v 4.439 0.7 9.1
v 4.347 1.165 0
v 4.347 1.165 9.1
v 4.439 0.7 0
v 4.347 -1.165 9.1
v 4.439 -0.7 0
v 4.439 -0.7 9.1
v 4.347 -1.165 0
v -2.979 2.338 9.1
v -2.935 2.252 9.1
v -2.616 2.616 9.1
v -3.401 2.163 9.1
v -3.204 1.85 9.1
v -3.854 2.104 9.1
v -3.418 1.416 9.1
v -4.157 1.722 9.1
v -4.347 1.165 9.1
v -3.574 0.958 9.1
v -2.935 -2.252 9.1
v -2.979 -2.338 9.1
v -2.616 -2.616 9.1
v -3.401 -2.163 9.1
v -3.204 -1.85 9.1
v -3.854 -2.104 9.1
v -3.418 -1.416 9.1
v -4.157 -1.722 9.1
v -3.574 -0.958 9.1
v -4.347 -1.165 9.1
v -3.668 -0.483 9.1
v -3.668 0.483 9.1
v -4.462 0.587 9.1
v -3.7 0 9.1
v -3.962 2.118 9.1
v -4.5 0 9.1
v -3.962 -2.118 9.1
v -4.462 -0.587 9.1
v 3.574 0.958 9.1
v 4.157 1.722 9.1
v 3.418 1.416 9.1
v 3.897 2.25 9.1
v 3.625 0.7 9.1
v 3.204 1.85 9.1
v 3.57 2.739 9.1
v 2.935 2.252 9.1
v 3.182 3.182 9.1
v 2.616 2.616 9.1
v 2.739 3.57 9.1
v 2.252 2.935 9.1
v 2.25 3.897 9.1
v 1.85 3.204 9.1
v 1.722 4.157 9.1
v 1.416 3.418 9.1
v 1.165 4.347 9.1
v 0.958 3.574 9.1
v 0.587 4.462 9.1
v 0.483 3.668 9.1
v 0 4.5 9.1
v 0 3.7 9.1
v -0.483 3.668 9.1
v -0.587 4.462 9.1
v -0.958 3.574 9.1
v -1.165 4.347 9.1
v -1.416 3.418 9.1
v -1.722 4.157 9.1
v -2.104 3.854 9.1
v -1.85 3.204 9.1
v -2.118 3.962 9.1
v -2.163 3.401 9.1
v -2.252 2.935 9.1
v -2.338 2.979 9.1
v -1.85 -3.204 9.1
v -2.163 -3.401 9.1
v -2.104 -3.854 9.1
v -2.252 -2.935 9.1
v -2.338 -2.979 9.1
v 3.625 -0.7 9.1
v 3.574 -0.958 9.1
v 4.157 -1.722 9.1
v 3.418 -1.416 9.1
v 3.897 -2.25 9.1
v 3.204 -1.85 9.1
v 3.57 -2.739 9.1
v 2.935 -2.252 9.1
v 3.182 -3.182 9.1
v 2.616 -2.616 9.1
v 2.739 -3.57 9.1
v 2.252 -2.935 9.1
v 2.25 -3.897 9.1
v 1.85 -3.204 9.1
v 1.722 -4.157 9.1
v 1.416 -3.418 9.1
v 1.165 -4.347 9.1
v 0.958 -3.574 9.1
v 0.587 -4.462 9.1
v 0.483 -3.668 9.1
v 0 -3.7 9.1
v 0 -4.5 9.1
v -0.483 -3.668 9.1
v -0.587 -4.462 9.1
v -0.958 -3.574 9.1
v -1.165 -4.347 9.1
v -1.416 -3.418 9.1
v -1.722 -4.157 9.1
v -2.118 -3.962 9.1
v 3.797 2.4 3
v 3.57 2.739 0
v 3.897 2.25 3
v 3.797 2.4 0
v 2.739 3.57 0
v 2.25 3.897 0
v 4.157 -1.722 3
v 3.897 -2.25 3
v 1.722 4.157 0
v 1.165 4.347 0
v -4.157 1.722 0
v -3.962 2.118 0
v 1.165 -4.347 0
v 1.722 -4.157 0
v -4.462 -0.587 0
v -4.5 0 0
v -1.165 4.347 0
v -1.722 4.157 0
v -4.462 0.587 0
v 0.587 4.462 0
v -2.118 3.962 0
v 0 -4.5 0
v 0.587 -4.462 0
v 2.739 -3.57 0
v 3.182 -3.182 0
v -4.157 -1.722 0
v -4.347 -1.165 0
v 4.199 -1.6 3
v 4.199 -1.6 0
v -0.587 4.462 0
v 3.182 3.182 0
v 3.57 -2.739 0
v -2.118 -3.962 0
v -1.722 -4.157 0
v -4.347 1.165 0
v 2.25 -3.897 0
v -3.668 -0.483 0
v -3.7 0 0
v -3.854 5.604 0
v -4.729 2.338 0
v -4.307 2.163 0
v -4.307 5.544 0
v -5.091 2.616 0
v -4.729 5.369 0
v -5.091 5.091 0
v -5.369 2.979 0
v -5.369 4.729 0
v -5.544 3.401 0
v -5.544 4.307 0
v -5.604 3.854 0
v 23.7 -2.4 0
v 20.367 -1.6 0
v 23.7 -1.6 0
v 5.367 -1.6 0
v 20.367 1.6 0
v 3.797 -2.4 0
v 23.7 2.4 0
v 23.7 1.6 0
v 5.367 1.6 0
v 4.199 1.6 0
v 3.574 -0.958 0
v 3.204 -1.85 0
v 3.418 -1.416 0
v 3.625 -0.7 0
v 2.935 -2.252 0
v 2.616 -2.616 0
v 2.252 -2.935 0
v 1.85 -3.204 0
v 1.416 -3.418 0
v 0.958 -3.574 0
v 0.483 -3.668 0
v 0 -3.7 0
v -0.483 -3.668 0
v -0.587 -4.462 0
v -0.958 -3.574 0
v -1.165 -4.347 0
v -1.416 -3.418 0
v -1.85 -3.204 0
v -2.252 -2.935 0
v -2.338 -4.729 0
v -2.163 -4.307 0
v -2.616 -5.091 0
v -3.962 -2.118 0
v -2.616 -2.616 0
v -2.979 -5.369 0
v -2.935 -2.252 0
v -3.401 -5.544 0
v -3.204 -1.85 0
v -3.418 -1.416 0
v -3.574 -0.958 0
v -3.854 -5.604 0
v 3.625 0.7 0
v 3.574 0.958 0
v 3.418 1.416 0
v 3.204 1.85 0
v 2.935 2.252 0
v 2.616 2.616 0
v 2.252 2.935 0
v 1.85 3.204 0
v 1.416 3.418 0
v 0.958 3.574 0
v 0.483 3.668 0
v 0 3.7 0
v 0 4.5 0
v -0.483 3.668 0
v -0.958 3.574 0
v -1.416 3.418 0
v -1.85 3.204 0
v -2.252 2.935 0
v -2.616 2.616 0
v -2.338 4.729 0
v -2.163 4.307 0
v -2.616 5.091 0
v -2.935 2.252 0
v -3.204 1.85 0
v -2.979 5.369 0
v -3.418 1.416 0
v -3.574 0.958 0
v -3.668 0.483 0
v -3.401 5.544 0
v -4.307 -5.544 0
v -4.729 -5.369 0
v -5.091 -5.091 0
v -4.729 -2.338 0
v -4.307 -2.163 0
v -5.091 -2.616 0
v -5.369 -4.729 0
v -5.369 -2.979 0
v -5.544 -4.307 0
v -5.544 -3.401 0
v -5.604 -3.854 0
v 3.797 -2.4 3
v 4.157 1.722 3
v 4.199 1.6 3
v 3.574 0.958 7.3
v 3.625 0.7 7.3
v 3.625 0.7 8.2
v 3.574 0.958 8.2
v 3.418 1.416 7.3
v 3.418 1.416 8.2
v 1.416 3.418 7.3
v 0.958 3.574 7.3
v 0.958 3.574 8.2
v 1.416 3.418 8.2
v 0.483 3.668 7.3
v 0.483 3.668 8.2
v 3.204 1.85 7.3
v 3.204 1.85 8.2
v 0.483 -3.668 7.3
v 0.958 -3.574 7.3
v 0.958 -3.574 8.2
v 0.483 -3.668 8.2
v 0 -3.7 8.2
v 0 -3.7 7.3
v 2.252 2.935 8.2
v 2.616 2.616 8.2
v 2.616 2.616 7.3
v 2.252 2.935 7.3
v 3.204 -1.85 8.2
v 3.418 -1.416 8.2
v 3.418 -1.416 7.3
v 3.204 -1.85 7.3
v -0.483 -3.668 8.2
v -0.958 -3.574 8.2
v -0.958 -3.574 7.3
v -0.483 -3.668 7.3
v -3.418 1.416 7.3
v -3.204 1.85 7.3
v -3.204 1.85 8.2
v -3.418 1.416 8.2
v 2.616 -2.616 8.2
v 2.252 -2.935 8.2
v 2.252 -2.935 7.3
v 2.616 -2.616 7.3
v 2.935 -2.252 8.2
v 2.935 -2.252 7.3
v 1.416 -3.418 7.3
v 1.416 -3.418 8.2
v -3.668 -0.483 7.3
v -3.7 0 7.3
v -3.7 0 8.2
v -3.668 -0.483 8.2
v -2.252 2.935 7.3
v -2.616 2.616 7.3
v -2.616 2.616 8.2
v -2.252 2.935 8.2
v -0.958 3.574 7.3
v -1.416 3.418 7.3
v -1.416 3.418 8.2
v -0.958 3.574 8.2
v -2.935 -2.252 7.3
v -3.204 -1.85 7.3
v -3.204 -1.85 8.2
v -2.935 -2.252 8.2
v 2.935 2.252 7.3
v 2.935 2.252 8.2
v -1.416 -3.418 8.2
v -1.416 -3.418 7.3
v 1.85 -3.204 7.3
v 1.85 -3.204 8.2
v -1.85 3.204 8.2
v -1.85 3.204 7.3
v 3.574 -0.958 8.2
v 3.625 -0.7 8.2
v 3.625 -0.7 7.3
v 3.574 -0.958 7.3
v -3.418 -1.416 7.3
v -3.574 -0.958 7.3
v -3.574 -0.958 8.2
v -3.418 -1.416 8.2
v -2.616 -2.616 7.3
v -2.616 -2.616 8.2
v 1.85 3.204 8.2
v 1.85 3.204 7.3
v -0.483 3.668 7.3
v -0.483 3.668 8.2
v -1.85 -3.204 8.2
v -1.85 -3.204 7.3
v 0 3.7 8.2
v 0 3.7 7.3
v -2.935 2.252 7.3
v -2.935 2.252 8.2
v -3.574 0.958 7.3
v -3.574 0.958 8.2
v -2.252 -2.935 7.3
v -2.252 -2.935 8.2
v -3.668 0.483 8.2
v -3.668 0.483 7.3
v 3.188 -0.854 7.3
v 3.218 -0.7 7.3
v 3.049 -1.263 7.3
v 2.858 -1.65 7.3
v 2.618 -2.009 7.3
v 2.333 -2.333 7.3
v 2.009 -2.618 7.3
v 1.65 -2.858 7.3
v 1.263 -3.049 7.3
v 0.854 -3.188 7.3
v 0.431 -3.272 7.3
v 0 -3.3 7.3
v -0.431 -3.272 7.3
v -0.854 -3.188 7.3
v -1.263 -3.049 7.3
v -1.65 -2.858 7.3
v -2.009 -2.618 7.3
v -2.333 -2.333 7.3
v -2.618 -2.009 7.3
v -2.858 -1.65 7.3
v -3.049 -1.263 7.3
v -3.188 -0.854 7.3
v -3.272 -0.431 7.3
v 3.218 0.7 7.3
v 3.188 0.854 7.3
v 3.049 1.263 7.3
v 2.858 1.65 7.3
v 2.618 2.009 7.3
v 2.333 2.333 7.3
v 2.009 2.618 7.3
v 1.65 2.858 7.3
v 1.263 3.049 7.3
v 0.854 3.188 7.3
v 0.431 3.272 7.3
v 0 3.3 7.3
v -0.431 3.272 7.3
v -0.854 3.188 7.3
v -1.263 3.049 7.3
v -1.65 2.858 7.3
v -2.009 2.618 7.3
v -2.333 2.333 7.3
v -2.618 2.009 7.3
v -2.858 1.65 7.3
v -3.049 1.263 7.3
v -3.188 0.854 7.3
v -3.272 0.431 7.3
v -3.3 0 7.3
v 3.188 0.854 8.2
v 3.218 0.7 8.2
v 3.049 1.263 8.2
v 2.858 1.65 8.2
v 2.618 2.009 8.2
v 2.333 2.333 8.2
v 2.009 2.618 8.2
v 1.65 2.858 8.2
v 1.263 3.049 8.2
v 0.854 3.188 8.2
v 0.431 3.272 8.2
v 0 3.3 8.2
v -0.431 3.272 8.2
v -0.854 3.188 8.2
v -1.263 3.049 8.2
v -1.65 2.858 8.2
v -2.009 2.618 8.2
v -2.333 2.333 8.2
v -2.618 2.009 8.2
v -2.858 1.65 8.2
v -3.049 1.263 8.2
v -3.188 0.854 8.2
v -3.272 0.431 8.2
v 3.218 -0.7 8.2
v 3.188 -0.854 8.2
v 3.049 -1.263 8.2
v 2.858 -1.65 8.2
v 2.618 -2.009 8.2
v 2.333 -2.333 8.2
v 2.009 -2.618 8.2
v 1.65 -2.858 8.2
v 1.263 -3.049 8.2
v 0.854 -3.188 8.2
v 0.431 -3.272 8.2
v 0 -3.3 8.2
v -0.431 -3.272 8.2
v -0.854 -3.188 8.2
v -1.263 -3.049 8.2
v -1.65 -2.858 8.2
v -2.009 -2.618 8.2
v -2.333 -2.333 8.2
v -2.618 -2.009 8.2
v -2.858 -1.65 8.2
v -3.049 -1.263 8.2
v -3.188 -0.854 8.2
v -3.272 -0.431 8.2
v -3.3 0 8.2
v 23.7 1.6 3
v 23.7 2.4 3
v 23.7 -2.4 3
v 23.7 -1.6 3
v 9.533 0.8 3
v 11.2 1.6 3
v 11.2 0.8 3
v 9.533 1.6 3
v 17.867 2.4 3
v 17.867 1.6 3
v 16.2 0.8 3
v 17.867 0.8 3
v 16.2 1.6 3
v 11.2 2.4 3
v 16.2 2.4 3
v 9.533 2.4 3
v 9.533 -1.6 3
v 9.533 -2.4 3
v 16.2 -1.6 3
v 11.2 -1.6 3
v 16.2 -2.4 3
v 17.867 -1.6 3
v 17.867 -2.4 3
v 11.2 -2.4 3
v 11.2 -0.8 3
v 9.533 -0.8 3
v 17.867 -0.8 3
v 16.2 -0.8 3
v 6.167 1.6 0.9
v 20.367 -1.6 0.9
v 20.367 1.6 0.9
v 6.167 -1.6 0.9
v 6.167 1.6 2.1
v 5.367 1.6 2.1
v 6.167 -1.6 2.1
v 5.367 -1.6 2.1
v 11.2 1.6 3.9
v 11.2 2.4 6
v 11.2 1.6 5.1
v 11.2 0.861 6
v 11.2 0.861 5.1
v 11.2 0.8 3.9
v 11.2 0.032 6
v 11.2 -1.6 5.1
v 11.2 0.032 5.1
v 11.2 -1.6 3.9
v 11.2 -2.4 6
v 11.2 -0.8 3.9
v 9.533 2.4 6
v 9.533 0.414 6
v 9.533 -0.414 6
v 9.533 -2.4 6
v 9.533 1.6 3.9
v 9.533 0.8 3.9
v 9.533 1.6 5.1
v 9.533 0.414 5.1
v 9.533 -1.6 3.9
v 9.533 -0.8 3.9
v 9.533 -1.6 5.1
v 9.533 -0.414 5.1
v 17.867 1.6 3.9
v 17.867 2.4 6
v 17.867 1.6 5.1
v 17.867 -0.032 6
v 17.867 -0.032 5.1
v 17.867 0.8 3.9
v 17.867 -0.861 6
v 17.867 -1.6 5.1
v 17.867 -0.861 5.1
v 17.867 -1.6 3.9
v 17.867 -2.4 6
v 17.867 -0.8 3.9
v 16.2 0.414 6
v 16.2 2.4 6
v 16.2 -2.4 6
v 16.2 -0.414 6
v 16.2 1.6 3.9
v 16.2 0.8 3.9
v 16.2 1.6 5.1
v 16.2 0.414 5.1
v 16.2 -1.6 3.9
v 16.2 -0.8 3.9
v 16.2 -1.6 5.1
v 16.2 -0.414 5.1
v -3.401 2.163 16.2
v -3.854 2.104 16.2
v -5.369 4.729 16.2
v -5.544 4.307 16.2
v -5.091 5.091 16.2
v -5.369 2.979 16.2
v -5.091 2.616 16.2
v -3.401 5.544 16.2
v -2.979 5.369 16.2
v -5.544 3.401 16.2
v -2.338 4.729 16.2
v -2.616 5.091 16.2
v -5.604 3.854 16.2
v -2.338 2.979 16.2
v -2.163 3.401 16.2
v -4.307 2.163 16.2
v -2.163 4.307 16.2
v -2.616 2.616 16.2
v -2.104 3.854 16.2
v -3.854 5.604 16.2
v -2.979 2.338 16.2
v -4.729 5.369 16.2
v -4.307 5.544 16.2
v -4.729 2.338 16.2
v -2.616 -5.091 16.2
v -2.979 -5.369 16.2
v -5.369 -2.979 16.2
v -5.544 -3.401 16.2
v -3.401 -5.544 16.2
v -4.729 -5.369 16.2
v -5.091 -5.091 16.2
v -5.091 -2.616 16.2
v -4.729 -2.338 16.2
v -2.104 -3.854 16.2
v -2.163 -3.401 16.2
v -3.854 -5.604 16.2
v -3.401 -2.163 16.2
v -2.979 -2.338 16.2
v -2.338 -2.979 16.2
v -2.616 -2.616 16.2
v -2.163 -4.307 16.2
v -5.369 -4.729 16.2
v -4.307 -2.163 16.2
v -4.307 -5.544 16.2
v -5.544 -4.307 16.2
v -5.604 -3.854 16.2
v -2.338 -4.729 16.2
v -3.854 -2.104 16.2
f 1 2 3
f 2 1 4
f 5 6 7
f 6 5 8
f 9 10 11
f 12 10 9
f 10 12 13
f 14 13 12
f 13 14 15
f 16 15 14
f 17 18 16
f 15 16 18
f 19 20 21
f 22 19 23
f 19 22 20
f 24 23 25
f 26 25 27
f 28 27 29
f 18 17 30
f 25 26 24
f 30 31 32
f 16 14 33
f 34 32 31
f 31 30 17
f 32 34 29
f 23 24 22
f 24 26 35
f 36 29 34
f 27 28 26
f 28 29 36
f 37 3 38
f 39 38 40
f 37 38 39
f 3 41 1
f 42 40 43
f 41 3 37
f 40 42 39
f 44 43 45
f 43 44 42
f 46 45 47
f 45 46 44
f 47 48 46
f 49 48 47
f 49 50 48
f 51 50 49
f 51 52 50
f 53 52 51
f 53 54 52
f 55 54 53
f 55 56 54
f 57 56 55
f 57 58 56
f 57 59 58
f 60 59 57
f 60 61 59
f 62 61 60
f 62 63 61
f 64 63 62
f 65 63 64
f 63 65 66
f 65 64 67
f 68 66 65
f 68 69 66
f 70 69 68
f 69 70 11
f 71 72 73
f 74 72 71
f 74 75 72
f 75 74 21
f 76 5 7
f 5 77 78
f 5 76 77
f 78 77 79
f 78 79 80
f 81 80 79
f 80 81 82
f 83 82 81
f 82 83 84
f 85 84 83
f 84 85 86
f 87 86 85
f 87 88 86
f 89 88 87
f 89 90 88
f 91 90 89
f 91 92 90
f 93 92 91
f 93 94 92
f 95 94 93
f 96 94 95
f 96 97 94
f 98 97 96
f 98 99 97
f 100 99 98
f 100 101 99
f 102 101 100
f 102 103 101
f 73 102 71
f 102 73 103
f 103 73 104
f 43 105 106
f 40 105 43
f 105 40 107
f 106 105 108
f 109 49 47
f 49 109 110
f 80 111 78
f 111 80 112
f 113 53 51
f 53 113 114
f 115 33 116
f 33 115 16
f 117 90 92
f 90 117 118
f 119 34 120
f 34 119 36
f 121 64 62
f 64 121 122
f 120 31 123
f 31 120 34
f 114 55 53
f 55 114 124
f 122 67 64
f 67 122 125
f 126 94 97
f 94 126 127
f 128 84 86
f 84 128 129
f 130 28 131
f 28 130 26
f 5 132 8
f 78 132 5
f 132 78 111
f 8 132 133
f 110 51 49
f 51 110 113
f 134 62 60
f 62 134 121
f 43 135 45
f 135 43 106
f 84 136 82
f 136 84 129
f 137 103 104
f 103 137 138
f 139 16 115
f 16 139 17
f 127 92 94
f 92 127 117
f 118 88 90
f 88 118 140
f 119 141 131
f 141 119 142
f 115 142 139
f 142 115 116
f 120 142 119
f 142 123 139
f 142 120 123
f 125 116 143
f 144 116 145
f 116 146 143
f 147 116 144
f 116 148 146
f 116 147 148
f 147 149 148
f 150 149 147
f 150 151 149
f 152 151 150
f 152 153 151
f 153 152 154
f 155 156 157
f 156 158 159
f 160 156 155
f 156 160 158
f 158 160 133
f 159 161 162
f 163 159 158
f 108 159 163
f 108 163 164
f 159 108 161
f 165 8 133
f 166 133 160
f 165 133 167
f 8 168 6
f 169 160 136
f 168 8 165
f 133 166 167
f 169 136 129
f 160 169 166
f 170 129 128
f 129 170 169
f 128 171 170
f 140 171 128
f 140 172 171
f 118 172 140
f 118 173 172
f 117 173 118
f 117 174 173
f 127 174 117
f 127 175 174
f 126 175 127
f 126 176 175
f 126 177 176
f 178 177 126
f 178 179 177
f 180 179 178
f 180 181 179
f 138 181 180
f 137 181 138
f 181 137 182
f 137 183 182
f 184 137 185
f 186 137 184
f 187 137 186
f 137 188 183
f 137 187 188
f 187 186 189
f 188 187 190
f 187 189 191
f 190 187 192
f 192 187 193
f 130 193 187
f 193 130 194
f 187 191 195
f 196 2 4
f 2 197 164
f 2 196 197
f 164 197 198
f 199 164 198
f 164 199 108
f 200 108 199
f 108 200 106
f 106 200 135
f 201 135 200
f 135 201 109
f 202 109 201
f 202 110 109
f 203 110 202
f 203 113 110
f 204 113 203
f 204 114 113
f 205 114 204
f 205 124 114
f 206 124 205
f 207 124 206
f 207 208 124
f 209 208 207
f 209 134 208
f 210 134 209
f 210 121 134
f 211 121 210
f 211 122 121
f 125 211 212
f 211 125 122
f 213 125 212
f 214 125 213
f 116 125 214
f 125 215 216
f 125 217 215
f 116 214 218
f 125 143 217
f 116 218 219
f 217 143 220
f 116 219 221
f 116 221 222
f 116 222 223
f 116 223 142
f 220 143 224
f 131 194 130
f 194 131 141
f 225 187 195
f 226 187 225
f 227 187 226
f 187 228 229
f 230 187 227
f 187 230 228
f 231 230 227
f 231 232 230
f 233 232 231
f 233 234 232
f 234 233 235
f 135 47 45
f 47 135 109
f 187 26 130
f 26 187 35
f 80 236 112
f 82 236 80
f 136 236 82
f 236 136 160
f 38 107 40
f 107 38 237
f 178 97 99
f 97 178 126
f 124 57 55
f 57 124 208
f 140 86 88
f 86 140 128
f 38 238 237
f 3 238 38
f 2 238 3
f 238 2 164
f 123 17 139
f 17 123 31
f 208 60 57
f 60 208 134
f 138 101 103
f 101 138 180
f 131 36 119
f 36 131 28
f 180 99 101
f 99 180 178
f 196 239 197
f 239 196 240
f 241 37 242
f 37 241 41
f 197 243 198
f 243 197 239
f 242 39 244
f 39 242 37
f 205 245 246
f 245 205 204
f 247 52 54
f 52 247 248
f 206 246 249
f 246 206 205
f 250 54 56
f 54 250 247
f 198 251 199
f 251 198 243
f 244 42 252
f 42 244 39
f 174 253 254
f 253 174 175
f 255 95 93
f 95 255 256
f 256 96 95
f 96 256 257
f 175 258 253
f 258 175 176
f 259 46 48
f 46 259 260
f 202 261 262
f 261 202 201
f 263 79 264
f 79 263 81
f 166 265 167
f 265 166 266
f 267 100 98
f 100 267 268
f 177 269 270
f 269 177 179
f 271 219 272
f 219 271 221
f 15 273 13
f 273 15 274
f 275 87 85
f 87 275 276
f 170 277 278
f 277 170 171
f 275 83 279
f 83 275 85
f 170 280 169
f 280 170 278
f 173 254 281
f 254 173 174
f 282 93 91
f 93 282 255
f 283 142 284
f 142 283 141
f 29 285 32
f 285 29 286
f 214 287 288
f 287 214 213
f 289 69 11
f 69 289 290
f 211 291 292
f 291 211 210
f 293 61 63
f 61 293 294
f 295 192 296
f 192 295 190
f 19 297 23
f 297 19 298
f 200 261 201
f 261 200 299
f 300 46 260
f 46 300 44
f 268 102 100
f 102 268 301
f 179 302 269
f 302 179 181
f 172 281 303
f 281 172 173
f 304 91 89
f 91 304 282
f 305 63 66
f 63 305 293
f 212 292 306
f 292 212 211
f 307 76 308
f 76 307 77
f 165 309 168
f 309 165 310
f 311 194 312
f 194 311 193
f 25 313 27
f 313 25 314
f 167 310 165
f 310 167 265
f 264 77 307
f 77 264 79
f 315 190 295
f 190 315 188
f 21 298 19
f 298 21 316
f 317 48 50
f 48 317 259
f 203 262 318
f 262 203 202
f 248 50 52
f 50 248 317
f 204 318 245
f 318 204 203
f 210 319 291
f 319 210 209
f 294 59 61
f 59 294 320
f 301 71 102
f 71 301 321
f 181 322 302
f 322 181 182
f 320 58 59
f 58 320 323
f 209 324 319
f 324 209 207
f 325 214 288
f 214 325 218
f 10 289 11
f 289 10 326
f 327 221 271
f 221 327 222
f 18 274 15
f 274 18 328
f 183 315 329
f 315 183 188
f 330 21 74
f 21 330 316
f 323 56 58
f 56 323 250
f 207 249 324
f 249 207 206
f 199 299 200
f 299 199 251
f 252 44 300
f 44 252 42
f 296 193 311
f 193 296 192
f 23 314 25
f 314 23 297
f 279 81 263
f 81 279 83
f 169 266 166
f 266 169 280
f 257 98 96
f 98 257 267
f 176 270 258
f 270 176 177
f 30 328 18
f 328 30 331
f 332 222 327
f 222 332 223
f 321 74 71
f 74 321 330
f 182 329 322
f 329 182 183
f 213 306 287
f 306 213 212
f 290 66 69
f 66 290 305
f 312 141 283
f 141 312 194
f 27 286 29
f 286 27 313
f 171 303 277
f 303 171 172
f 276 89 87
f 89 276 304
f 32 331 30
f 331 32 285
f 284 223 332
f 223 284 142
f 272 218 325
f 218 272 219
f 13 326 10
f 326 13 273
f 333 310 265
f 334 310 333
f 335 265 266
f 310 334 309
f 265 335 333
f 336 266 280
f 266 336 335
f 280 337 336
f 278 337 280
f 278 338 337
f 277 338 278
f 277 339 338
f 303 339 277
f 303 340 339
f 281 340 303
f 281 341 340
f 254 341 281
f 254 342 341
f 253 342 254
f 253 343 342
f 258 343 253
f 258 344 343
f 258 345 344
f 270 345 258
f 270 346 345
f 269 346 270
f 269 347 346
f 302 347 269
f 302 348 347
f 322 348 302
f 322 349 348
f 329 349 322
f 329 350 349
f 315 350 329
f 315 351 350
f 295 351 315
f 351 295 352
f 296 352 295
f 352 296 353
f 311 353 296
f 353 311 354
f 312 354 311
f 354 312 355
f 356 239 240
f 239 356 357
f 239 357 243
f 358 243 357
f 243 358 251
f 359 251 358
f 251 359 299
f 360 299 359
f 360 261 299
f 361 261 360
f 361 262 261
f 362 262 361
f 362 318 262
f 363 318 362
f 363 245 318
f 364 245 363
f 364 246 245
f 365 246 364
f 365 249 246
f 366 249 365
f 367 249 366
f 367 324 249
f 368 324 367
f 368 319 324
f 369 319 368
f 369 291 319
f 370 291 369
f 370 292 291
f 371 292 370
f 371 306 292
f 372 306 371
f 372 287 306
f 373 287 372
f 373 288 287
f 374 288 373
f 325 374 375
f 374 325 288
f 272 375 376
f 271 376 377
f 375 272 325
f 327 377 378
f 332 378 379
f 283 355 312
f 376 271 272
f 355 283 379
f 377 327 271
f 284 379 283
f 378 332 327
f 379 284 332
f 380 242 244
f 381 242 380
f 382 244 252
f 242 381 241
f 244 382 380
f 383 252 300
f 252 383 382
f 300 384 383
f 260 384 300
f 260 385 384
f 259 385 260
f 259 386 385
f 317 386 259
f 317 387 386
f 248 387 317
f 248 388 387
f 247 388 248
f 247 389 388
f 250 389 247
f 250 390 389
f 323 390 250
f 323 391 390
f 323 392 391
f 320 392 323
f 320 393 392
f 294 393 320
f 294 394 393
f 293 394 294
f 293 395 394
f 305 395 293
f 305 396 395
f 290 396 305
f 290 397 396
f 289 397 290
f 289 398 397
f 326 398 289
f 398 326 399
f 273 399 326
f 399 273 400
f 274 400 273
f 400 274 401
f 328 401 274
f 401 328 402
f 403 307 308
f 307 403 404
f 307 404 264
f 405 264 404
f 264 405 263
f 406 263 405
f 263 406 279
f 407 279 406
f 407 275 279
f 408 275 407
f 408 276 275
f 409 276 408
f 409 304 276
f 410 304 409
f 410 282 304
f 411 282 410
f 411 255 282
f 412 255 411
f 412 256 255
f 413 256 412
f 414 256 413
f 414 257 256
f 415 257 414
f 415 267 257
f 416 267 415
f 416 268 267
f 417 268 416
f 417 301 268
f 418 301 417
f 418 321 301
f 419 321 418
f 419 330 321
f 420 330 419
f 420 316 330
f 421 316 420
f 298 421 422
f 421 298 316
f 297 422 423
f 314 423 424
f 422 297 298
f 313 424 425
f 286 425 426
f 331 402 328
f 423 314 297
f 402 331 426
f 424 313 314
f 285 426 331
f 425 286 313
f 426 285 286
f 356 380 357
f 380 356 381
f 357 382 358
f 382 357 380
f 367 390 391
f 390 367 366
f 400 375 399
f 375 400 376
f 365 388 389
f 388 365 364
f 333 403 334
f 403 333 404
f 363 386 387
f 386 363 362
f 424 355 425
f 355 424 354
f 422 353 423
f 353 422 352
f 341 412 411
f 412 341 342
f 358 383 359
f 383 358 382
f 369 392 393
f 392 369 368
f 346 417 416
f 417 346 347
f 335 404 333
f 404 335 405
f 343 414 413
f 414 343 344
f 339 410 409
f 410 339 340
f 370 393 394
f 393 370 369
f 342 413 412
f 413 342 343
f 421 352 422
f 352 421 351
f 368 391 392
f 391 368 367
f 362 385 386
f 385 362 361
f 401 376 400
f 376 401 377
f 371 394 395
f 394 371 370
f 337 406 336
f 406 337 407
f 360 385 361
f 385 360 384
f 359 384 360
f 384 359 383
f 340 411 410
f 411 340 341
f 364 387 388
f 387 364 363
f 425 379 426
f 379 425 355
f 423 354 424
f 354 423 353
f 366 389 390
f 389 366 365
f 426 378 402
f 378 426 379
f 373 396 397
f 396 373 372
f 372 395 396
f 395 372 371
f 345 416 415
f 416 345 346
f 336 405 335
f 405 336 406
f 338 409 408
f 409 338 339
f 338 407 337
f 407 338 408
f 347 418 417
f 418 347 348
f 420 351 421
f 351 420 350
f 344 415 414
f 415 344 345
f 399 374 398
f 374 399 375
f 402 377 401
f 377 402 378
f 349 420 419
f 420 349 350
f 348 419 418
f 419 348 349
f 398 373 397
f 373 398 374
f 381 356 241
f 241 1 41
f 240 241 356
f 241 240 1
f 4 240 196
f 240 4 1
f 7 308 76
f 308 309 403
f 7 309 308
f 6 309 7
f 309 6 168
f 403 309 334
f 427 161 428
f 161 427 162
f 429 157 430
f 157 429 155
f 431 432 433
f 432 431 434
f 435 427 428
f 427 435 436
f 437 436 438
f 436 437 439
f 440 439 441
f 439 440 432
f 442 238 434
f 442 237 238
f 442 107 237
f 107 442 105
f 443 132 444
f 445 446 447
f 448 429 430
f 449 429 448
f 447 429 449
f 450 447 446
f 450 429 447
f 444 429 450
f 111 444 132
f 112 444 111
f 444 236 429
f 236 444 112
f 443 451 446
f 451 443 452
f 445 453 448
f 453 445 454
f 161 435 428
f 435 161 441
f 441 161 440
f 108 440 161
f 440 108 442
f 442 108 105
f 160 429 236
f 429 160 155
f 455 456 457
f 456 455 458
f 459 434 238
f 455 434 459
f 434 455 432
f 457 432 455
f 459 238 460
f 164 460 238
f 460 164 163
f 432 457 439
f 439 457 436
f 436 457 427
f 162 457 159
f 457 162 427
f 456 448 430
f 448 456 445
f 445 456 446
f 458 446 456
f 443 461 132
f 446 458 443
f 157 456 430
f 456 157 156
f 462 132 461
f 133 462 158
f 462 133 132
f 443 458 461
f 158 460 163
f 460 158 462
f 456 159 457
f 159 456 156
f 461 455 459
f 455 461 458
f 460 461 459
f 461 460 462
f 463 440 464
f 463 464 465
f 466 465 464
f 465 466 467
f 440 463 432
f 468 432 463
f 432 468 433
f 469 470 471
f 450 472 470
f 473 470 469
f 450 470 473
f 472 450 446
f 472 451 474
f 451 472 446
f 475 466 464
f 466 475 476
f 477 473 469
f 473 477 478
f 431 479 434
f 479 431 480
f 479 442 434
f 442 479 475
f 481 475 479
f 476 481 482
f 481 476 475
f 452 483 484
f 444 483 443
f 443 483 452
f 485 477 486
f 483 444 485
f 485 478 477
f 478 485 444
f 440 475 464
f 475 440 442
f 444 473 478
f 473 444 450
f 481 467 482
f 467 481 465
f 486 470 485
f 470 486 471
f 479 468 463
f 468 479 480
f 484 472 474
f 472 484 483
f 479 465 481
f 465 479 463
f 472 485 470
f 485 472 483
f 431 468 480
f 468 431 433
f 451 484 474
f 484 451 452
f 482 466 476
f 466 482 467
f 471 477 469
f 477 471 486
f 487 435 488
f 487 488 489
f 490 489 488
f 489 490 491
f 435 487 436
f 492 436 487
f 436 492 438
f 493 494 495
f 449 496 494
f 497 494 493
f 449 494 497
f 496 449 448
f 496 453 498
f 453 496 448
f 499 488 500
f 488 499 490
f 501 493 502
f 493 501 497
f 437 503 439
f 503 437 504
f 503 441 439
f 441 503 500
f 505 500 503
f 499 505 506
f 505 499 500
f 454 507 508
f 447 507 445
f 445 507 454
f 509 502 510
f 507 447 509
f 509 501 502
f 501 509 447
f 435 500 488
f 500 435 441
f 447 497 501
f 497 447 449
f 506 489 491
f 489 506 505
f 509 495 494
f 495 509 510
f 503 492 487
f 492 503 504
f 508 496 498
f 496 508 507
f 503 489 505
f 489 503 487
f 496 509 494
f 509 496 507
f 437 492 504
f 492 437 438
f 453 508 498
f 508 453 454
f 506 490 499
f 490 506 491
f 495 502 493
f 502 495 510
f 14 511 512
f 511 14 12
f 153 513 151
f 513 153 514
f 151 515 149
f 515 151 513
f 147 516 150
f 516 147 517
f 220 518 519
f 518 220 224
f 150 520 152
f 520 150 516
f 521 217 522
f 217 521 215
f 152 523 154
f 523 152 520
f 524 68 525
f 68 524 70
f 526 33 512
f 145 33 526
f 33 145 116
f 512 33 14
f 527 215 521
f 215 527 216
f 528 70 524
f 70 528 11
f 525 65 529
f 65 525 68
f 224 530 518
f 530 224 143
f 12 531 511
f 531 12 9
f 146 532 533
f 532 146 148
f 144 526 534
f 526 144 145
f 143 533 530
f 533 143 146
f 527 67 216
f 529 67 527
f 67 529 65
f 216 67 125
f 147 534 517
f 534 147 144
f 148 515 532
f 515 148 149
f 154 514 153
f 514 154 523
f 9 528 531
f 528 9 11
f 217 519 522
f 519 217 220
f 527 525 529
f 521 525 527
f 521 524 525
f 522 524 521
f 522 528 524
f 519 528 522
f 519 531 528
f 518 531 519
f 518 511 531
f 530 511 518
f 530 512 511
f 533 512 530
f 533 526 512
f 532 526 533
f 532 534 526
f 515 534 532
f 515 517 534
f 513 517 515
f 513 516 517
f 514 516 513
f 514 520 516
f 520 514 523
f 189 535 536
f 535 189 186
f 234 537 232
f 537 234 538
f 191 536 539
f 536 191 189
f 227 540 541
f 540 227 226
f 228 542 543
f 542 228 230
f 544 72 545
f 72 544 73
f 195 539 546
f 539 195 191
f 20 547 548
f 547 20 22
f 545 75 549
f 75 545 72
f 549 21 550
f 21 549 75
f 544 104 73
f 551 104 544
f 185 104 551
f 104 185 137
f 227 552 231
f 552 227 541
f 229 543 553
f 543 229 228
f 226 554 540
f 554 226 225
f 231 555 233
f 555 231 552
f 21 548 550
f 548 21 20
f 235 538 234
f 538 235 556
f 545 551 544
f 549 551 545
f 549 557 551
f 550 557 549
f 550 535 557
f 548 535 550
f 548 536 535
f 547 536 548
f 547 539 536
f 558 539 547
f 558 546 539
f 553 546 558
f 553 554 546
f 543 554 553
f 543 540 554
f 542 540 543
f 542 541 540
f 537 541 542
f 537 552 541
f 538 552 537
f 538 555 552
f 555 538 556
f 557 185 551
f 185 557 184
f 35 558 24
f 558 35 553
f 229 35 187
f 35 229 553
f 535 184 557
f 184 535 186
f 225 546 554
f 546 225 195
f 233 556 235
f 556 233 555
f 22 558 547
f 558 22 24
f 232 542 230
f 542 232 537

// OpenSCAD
// Crazyflie 2.0 motor mount

// Copyright (C) 2015 Embecosm Limited (www.embecosm.com)

// Contributor: Jeremy Bennett <jeremy.bennett@embecosm.com>

// This file is licensed under the Creative Commons Attribution-ShareAlike 3.0
// Unported License. To view a copy of this license, visit
// http://creativecommons.org/licenses/by-sa/3.0/ or send a letter to Creative
// Commons, PO Box 1866, Mountain View, CA 94042, USA.


// Unlike the original motor-mount, this is a conceptual equivalent, more
// suited for 3D printing on a Rep Rap.

// Stick the various parts together in the correct place.  Everything sits on
// or above the X-Y plane, with the motor mount cylinder centered on the
// origin.


// Tiny amount to ensure overlap for simple manifolds
EPS = 0.001;

// Vertical wall thickness throughout. Best if a multiple of the layer
// thickness (so needs slic3r coordination).
TV = 0.9;

// Horizontal wall thickness throughout. Best if a multiple of the head
// diameter.
TH = 0.8;

// Constants defining the components
MOTOR_CYL_D    = 7.4;           // Motor is 6.9, this allows for "bleed"
MOTOR_CYL_R    = MOTOR_CYL_D / 2;
MOTOR_CYL_H    = 9.1;           // Real cylinder extends 0.8 below
MOTOR_SLOT_W   = 1.4;
MOTOR_RIDGE_T  = 0.4;

LEG_H = 16.2;                   // Real leg extends 0.8 below
LEG_W =  3.5;

// PCB dimensions
ARM_W =  3.2;                   // PCB is actually 3.0
ARM_T =  2.1;                   // PCB is actually 1.4
ARM_L = 20.0;
BAR_W = ARM_L / 12;

// Hook
HOOK_H = 3.0;

// The motor cylinder

module motor_cyl () {
   $fn = 48;
   difference () {
      union () {
         // The main cylinder
         difference () {
            cylinder (r = MOTOR_CYL_R + TH, h = MOTOR_CYL_H, center = false);
            cylinder (r = MOTOR_CYL_R,      h = MOTOR_CYL_H, center = false);
         }
         // The ridge 1/2 wall thickness and 1 wall thickness up from the bottom
         translate (v = [0, 0, MOTOR_CYL_H - TV * 2])
            difference () {
               cylinder (r = MOTOR_CYL_R + EPS,    h = TV,  center = false);
               cylinder (r = MOTOR_CYL_R - TH / 2, h = TV , center = false);
            }
      }
      // Slot
      translate (v = [0, -MOTOR_SLOT_W / 2, 0])
         cube (size = [MOTOR_CYL_R *2, MOTOR_SLOT_W, MOTOR_CYL_H],
               center = false);
   }
}


// The legs. For now we do as a cube

// @param  off  Distance to translate along X axis before rotating
// @param  a    Angle to rotate around Z axis

module legs (off, a) {
   $fn = 24;
   rotate (a = [0, 0, a])
      translate (v = [off + LEG_W / 2,, 0])
	 cylinder (r = LEG_W / 2, h = LEG_H, center = false);
}


// The basic ARM

// @param  xoff  Offset in X direction

module arm (xoff) {
   translate (v = [xoff, -ARM_W / 2 - TH, 0]) {
      // Main bar
      difference () {
         cube (size = [ARM_L, ARM_W + TH * 2, ARM_T + TV], center = false);
         // Hollow for PCB
         translate (v = [0, TH, TV])
            cube (size = [ARM_L, ARM_W, ARM_T], center = false);
         // Original has 4 Cutouts in base for flexibility. We just provide
         // the one at each end.
         translate (v = [0, TH, 0])
            cube (size = [BAR_W, ARM_W, TV + EPS], center = false);
         translate (v = [BAR_W * 10, TH, 0])
            cube (size = [BAR_W * 2 + EPS, ARM_W, TV + EPS], center = false);
      }
      // endstop is BAR_W in from the end
      translate (v = [BAR_W, TH, 0])
         cube (size = [TH, ARM_W, ARM_T], center = false);
   }
}


// Barrel for wire hooks

// Wire hooks across the top

// @param[in] xoff  Offset from X direction
// @param[in] ang   Angle to rotate the top slot

module wire_hook (xoff, ang) {
   translate (v = [xoff, 0, ARM_T + TV])
      difference () {
         // Basic hollow cube
         translate (v = [0, -ARM_W / 2 - TH, 0])
            cube (size = [BAR_W, ARM_W + TH * 2, HOOK_H], center = false);
         translate (v = [0, -ARM_W / 2, TV])
            cube (size = [BAR_W, ARM_W, HOOK_H - TV * 2], center = false);
         // Slot at bottom
         translate (v = [0, -ARM_W / 2 + TH, 0])
            cube (size = [BAR_W, ARM_W - TH * 2, TV], center = false);
         // Slot at top for wire
         rotate (a = [0, 0, ang])
            translate (v = [-BAR_W, -TH / 2, HOOK_H - TV])
               cube (size = [BAR_W * 3, TH, TV], center = false);
      }
}


// Stick everything together.
module motor_mount () {
   motor_cyl ();
   // Legs are embedded in the cylinder wall
   legs (MOTOR_CYL_R, 135.0);
   legs (MOTOR_CYL_R, 225.0);
   // This ensures arm intersects with cylinder
   arm (MOTOR_CYL_R);
   wire_hook (xoff = MOTOR_CYL_R + BAR_W * 3.5, ang =  15);
   wire_hook (xoff = MOTOR_CYL_R + BAR_W * 7.5, ang = -15);
}


motor_mount ();
